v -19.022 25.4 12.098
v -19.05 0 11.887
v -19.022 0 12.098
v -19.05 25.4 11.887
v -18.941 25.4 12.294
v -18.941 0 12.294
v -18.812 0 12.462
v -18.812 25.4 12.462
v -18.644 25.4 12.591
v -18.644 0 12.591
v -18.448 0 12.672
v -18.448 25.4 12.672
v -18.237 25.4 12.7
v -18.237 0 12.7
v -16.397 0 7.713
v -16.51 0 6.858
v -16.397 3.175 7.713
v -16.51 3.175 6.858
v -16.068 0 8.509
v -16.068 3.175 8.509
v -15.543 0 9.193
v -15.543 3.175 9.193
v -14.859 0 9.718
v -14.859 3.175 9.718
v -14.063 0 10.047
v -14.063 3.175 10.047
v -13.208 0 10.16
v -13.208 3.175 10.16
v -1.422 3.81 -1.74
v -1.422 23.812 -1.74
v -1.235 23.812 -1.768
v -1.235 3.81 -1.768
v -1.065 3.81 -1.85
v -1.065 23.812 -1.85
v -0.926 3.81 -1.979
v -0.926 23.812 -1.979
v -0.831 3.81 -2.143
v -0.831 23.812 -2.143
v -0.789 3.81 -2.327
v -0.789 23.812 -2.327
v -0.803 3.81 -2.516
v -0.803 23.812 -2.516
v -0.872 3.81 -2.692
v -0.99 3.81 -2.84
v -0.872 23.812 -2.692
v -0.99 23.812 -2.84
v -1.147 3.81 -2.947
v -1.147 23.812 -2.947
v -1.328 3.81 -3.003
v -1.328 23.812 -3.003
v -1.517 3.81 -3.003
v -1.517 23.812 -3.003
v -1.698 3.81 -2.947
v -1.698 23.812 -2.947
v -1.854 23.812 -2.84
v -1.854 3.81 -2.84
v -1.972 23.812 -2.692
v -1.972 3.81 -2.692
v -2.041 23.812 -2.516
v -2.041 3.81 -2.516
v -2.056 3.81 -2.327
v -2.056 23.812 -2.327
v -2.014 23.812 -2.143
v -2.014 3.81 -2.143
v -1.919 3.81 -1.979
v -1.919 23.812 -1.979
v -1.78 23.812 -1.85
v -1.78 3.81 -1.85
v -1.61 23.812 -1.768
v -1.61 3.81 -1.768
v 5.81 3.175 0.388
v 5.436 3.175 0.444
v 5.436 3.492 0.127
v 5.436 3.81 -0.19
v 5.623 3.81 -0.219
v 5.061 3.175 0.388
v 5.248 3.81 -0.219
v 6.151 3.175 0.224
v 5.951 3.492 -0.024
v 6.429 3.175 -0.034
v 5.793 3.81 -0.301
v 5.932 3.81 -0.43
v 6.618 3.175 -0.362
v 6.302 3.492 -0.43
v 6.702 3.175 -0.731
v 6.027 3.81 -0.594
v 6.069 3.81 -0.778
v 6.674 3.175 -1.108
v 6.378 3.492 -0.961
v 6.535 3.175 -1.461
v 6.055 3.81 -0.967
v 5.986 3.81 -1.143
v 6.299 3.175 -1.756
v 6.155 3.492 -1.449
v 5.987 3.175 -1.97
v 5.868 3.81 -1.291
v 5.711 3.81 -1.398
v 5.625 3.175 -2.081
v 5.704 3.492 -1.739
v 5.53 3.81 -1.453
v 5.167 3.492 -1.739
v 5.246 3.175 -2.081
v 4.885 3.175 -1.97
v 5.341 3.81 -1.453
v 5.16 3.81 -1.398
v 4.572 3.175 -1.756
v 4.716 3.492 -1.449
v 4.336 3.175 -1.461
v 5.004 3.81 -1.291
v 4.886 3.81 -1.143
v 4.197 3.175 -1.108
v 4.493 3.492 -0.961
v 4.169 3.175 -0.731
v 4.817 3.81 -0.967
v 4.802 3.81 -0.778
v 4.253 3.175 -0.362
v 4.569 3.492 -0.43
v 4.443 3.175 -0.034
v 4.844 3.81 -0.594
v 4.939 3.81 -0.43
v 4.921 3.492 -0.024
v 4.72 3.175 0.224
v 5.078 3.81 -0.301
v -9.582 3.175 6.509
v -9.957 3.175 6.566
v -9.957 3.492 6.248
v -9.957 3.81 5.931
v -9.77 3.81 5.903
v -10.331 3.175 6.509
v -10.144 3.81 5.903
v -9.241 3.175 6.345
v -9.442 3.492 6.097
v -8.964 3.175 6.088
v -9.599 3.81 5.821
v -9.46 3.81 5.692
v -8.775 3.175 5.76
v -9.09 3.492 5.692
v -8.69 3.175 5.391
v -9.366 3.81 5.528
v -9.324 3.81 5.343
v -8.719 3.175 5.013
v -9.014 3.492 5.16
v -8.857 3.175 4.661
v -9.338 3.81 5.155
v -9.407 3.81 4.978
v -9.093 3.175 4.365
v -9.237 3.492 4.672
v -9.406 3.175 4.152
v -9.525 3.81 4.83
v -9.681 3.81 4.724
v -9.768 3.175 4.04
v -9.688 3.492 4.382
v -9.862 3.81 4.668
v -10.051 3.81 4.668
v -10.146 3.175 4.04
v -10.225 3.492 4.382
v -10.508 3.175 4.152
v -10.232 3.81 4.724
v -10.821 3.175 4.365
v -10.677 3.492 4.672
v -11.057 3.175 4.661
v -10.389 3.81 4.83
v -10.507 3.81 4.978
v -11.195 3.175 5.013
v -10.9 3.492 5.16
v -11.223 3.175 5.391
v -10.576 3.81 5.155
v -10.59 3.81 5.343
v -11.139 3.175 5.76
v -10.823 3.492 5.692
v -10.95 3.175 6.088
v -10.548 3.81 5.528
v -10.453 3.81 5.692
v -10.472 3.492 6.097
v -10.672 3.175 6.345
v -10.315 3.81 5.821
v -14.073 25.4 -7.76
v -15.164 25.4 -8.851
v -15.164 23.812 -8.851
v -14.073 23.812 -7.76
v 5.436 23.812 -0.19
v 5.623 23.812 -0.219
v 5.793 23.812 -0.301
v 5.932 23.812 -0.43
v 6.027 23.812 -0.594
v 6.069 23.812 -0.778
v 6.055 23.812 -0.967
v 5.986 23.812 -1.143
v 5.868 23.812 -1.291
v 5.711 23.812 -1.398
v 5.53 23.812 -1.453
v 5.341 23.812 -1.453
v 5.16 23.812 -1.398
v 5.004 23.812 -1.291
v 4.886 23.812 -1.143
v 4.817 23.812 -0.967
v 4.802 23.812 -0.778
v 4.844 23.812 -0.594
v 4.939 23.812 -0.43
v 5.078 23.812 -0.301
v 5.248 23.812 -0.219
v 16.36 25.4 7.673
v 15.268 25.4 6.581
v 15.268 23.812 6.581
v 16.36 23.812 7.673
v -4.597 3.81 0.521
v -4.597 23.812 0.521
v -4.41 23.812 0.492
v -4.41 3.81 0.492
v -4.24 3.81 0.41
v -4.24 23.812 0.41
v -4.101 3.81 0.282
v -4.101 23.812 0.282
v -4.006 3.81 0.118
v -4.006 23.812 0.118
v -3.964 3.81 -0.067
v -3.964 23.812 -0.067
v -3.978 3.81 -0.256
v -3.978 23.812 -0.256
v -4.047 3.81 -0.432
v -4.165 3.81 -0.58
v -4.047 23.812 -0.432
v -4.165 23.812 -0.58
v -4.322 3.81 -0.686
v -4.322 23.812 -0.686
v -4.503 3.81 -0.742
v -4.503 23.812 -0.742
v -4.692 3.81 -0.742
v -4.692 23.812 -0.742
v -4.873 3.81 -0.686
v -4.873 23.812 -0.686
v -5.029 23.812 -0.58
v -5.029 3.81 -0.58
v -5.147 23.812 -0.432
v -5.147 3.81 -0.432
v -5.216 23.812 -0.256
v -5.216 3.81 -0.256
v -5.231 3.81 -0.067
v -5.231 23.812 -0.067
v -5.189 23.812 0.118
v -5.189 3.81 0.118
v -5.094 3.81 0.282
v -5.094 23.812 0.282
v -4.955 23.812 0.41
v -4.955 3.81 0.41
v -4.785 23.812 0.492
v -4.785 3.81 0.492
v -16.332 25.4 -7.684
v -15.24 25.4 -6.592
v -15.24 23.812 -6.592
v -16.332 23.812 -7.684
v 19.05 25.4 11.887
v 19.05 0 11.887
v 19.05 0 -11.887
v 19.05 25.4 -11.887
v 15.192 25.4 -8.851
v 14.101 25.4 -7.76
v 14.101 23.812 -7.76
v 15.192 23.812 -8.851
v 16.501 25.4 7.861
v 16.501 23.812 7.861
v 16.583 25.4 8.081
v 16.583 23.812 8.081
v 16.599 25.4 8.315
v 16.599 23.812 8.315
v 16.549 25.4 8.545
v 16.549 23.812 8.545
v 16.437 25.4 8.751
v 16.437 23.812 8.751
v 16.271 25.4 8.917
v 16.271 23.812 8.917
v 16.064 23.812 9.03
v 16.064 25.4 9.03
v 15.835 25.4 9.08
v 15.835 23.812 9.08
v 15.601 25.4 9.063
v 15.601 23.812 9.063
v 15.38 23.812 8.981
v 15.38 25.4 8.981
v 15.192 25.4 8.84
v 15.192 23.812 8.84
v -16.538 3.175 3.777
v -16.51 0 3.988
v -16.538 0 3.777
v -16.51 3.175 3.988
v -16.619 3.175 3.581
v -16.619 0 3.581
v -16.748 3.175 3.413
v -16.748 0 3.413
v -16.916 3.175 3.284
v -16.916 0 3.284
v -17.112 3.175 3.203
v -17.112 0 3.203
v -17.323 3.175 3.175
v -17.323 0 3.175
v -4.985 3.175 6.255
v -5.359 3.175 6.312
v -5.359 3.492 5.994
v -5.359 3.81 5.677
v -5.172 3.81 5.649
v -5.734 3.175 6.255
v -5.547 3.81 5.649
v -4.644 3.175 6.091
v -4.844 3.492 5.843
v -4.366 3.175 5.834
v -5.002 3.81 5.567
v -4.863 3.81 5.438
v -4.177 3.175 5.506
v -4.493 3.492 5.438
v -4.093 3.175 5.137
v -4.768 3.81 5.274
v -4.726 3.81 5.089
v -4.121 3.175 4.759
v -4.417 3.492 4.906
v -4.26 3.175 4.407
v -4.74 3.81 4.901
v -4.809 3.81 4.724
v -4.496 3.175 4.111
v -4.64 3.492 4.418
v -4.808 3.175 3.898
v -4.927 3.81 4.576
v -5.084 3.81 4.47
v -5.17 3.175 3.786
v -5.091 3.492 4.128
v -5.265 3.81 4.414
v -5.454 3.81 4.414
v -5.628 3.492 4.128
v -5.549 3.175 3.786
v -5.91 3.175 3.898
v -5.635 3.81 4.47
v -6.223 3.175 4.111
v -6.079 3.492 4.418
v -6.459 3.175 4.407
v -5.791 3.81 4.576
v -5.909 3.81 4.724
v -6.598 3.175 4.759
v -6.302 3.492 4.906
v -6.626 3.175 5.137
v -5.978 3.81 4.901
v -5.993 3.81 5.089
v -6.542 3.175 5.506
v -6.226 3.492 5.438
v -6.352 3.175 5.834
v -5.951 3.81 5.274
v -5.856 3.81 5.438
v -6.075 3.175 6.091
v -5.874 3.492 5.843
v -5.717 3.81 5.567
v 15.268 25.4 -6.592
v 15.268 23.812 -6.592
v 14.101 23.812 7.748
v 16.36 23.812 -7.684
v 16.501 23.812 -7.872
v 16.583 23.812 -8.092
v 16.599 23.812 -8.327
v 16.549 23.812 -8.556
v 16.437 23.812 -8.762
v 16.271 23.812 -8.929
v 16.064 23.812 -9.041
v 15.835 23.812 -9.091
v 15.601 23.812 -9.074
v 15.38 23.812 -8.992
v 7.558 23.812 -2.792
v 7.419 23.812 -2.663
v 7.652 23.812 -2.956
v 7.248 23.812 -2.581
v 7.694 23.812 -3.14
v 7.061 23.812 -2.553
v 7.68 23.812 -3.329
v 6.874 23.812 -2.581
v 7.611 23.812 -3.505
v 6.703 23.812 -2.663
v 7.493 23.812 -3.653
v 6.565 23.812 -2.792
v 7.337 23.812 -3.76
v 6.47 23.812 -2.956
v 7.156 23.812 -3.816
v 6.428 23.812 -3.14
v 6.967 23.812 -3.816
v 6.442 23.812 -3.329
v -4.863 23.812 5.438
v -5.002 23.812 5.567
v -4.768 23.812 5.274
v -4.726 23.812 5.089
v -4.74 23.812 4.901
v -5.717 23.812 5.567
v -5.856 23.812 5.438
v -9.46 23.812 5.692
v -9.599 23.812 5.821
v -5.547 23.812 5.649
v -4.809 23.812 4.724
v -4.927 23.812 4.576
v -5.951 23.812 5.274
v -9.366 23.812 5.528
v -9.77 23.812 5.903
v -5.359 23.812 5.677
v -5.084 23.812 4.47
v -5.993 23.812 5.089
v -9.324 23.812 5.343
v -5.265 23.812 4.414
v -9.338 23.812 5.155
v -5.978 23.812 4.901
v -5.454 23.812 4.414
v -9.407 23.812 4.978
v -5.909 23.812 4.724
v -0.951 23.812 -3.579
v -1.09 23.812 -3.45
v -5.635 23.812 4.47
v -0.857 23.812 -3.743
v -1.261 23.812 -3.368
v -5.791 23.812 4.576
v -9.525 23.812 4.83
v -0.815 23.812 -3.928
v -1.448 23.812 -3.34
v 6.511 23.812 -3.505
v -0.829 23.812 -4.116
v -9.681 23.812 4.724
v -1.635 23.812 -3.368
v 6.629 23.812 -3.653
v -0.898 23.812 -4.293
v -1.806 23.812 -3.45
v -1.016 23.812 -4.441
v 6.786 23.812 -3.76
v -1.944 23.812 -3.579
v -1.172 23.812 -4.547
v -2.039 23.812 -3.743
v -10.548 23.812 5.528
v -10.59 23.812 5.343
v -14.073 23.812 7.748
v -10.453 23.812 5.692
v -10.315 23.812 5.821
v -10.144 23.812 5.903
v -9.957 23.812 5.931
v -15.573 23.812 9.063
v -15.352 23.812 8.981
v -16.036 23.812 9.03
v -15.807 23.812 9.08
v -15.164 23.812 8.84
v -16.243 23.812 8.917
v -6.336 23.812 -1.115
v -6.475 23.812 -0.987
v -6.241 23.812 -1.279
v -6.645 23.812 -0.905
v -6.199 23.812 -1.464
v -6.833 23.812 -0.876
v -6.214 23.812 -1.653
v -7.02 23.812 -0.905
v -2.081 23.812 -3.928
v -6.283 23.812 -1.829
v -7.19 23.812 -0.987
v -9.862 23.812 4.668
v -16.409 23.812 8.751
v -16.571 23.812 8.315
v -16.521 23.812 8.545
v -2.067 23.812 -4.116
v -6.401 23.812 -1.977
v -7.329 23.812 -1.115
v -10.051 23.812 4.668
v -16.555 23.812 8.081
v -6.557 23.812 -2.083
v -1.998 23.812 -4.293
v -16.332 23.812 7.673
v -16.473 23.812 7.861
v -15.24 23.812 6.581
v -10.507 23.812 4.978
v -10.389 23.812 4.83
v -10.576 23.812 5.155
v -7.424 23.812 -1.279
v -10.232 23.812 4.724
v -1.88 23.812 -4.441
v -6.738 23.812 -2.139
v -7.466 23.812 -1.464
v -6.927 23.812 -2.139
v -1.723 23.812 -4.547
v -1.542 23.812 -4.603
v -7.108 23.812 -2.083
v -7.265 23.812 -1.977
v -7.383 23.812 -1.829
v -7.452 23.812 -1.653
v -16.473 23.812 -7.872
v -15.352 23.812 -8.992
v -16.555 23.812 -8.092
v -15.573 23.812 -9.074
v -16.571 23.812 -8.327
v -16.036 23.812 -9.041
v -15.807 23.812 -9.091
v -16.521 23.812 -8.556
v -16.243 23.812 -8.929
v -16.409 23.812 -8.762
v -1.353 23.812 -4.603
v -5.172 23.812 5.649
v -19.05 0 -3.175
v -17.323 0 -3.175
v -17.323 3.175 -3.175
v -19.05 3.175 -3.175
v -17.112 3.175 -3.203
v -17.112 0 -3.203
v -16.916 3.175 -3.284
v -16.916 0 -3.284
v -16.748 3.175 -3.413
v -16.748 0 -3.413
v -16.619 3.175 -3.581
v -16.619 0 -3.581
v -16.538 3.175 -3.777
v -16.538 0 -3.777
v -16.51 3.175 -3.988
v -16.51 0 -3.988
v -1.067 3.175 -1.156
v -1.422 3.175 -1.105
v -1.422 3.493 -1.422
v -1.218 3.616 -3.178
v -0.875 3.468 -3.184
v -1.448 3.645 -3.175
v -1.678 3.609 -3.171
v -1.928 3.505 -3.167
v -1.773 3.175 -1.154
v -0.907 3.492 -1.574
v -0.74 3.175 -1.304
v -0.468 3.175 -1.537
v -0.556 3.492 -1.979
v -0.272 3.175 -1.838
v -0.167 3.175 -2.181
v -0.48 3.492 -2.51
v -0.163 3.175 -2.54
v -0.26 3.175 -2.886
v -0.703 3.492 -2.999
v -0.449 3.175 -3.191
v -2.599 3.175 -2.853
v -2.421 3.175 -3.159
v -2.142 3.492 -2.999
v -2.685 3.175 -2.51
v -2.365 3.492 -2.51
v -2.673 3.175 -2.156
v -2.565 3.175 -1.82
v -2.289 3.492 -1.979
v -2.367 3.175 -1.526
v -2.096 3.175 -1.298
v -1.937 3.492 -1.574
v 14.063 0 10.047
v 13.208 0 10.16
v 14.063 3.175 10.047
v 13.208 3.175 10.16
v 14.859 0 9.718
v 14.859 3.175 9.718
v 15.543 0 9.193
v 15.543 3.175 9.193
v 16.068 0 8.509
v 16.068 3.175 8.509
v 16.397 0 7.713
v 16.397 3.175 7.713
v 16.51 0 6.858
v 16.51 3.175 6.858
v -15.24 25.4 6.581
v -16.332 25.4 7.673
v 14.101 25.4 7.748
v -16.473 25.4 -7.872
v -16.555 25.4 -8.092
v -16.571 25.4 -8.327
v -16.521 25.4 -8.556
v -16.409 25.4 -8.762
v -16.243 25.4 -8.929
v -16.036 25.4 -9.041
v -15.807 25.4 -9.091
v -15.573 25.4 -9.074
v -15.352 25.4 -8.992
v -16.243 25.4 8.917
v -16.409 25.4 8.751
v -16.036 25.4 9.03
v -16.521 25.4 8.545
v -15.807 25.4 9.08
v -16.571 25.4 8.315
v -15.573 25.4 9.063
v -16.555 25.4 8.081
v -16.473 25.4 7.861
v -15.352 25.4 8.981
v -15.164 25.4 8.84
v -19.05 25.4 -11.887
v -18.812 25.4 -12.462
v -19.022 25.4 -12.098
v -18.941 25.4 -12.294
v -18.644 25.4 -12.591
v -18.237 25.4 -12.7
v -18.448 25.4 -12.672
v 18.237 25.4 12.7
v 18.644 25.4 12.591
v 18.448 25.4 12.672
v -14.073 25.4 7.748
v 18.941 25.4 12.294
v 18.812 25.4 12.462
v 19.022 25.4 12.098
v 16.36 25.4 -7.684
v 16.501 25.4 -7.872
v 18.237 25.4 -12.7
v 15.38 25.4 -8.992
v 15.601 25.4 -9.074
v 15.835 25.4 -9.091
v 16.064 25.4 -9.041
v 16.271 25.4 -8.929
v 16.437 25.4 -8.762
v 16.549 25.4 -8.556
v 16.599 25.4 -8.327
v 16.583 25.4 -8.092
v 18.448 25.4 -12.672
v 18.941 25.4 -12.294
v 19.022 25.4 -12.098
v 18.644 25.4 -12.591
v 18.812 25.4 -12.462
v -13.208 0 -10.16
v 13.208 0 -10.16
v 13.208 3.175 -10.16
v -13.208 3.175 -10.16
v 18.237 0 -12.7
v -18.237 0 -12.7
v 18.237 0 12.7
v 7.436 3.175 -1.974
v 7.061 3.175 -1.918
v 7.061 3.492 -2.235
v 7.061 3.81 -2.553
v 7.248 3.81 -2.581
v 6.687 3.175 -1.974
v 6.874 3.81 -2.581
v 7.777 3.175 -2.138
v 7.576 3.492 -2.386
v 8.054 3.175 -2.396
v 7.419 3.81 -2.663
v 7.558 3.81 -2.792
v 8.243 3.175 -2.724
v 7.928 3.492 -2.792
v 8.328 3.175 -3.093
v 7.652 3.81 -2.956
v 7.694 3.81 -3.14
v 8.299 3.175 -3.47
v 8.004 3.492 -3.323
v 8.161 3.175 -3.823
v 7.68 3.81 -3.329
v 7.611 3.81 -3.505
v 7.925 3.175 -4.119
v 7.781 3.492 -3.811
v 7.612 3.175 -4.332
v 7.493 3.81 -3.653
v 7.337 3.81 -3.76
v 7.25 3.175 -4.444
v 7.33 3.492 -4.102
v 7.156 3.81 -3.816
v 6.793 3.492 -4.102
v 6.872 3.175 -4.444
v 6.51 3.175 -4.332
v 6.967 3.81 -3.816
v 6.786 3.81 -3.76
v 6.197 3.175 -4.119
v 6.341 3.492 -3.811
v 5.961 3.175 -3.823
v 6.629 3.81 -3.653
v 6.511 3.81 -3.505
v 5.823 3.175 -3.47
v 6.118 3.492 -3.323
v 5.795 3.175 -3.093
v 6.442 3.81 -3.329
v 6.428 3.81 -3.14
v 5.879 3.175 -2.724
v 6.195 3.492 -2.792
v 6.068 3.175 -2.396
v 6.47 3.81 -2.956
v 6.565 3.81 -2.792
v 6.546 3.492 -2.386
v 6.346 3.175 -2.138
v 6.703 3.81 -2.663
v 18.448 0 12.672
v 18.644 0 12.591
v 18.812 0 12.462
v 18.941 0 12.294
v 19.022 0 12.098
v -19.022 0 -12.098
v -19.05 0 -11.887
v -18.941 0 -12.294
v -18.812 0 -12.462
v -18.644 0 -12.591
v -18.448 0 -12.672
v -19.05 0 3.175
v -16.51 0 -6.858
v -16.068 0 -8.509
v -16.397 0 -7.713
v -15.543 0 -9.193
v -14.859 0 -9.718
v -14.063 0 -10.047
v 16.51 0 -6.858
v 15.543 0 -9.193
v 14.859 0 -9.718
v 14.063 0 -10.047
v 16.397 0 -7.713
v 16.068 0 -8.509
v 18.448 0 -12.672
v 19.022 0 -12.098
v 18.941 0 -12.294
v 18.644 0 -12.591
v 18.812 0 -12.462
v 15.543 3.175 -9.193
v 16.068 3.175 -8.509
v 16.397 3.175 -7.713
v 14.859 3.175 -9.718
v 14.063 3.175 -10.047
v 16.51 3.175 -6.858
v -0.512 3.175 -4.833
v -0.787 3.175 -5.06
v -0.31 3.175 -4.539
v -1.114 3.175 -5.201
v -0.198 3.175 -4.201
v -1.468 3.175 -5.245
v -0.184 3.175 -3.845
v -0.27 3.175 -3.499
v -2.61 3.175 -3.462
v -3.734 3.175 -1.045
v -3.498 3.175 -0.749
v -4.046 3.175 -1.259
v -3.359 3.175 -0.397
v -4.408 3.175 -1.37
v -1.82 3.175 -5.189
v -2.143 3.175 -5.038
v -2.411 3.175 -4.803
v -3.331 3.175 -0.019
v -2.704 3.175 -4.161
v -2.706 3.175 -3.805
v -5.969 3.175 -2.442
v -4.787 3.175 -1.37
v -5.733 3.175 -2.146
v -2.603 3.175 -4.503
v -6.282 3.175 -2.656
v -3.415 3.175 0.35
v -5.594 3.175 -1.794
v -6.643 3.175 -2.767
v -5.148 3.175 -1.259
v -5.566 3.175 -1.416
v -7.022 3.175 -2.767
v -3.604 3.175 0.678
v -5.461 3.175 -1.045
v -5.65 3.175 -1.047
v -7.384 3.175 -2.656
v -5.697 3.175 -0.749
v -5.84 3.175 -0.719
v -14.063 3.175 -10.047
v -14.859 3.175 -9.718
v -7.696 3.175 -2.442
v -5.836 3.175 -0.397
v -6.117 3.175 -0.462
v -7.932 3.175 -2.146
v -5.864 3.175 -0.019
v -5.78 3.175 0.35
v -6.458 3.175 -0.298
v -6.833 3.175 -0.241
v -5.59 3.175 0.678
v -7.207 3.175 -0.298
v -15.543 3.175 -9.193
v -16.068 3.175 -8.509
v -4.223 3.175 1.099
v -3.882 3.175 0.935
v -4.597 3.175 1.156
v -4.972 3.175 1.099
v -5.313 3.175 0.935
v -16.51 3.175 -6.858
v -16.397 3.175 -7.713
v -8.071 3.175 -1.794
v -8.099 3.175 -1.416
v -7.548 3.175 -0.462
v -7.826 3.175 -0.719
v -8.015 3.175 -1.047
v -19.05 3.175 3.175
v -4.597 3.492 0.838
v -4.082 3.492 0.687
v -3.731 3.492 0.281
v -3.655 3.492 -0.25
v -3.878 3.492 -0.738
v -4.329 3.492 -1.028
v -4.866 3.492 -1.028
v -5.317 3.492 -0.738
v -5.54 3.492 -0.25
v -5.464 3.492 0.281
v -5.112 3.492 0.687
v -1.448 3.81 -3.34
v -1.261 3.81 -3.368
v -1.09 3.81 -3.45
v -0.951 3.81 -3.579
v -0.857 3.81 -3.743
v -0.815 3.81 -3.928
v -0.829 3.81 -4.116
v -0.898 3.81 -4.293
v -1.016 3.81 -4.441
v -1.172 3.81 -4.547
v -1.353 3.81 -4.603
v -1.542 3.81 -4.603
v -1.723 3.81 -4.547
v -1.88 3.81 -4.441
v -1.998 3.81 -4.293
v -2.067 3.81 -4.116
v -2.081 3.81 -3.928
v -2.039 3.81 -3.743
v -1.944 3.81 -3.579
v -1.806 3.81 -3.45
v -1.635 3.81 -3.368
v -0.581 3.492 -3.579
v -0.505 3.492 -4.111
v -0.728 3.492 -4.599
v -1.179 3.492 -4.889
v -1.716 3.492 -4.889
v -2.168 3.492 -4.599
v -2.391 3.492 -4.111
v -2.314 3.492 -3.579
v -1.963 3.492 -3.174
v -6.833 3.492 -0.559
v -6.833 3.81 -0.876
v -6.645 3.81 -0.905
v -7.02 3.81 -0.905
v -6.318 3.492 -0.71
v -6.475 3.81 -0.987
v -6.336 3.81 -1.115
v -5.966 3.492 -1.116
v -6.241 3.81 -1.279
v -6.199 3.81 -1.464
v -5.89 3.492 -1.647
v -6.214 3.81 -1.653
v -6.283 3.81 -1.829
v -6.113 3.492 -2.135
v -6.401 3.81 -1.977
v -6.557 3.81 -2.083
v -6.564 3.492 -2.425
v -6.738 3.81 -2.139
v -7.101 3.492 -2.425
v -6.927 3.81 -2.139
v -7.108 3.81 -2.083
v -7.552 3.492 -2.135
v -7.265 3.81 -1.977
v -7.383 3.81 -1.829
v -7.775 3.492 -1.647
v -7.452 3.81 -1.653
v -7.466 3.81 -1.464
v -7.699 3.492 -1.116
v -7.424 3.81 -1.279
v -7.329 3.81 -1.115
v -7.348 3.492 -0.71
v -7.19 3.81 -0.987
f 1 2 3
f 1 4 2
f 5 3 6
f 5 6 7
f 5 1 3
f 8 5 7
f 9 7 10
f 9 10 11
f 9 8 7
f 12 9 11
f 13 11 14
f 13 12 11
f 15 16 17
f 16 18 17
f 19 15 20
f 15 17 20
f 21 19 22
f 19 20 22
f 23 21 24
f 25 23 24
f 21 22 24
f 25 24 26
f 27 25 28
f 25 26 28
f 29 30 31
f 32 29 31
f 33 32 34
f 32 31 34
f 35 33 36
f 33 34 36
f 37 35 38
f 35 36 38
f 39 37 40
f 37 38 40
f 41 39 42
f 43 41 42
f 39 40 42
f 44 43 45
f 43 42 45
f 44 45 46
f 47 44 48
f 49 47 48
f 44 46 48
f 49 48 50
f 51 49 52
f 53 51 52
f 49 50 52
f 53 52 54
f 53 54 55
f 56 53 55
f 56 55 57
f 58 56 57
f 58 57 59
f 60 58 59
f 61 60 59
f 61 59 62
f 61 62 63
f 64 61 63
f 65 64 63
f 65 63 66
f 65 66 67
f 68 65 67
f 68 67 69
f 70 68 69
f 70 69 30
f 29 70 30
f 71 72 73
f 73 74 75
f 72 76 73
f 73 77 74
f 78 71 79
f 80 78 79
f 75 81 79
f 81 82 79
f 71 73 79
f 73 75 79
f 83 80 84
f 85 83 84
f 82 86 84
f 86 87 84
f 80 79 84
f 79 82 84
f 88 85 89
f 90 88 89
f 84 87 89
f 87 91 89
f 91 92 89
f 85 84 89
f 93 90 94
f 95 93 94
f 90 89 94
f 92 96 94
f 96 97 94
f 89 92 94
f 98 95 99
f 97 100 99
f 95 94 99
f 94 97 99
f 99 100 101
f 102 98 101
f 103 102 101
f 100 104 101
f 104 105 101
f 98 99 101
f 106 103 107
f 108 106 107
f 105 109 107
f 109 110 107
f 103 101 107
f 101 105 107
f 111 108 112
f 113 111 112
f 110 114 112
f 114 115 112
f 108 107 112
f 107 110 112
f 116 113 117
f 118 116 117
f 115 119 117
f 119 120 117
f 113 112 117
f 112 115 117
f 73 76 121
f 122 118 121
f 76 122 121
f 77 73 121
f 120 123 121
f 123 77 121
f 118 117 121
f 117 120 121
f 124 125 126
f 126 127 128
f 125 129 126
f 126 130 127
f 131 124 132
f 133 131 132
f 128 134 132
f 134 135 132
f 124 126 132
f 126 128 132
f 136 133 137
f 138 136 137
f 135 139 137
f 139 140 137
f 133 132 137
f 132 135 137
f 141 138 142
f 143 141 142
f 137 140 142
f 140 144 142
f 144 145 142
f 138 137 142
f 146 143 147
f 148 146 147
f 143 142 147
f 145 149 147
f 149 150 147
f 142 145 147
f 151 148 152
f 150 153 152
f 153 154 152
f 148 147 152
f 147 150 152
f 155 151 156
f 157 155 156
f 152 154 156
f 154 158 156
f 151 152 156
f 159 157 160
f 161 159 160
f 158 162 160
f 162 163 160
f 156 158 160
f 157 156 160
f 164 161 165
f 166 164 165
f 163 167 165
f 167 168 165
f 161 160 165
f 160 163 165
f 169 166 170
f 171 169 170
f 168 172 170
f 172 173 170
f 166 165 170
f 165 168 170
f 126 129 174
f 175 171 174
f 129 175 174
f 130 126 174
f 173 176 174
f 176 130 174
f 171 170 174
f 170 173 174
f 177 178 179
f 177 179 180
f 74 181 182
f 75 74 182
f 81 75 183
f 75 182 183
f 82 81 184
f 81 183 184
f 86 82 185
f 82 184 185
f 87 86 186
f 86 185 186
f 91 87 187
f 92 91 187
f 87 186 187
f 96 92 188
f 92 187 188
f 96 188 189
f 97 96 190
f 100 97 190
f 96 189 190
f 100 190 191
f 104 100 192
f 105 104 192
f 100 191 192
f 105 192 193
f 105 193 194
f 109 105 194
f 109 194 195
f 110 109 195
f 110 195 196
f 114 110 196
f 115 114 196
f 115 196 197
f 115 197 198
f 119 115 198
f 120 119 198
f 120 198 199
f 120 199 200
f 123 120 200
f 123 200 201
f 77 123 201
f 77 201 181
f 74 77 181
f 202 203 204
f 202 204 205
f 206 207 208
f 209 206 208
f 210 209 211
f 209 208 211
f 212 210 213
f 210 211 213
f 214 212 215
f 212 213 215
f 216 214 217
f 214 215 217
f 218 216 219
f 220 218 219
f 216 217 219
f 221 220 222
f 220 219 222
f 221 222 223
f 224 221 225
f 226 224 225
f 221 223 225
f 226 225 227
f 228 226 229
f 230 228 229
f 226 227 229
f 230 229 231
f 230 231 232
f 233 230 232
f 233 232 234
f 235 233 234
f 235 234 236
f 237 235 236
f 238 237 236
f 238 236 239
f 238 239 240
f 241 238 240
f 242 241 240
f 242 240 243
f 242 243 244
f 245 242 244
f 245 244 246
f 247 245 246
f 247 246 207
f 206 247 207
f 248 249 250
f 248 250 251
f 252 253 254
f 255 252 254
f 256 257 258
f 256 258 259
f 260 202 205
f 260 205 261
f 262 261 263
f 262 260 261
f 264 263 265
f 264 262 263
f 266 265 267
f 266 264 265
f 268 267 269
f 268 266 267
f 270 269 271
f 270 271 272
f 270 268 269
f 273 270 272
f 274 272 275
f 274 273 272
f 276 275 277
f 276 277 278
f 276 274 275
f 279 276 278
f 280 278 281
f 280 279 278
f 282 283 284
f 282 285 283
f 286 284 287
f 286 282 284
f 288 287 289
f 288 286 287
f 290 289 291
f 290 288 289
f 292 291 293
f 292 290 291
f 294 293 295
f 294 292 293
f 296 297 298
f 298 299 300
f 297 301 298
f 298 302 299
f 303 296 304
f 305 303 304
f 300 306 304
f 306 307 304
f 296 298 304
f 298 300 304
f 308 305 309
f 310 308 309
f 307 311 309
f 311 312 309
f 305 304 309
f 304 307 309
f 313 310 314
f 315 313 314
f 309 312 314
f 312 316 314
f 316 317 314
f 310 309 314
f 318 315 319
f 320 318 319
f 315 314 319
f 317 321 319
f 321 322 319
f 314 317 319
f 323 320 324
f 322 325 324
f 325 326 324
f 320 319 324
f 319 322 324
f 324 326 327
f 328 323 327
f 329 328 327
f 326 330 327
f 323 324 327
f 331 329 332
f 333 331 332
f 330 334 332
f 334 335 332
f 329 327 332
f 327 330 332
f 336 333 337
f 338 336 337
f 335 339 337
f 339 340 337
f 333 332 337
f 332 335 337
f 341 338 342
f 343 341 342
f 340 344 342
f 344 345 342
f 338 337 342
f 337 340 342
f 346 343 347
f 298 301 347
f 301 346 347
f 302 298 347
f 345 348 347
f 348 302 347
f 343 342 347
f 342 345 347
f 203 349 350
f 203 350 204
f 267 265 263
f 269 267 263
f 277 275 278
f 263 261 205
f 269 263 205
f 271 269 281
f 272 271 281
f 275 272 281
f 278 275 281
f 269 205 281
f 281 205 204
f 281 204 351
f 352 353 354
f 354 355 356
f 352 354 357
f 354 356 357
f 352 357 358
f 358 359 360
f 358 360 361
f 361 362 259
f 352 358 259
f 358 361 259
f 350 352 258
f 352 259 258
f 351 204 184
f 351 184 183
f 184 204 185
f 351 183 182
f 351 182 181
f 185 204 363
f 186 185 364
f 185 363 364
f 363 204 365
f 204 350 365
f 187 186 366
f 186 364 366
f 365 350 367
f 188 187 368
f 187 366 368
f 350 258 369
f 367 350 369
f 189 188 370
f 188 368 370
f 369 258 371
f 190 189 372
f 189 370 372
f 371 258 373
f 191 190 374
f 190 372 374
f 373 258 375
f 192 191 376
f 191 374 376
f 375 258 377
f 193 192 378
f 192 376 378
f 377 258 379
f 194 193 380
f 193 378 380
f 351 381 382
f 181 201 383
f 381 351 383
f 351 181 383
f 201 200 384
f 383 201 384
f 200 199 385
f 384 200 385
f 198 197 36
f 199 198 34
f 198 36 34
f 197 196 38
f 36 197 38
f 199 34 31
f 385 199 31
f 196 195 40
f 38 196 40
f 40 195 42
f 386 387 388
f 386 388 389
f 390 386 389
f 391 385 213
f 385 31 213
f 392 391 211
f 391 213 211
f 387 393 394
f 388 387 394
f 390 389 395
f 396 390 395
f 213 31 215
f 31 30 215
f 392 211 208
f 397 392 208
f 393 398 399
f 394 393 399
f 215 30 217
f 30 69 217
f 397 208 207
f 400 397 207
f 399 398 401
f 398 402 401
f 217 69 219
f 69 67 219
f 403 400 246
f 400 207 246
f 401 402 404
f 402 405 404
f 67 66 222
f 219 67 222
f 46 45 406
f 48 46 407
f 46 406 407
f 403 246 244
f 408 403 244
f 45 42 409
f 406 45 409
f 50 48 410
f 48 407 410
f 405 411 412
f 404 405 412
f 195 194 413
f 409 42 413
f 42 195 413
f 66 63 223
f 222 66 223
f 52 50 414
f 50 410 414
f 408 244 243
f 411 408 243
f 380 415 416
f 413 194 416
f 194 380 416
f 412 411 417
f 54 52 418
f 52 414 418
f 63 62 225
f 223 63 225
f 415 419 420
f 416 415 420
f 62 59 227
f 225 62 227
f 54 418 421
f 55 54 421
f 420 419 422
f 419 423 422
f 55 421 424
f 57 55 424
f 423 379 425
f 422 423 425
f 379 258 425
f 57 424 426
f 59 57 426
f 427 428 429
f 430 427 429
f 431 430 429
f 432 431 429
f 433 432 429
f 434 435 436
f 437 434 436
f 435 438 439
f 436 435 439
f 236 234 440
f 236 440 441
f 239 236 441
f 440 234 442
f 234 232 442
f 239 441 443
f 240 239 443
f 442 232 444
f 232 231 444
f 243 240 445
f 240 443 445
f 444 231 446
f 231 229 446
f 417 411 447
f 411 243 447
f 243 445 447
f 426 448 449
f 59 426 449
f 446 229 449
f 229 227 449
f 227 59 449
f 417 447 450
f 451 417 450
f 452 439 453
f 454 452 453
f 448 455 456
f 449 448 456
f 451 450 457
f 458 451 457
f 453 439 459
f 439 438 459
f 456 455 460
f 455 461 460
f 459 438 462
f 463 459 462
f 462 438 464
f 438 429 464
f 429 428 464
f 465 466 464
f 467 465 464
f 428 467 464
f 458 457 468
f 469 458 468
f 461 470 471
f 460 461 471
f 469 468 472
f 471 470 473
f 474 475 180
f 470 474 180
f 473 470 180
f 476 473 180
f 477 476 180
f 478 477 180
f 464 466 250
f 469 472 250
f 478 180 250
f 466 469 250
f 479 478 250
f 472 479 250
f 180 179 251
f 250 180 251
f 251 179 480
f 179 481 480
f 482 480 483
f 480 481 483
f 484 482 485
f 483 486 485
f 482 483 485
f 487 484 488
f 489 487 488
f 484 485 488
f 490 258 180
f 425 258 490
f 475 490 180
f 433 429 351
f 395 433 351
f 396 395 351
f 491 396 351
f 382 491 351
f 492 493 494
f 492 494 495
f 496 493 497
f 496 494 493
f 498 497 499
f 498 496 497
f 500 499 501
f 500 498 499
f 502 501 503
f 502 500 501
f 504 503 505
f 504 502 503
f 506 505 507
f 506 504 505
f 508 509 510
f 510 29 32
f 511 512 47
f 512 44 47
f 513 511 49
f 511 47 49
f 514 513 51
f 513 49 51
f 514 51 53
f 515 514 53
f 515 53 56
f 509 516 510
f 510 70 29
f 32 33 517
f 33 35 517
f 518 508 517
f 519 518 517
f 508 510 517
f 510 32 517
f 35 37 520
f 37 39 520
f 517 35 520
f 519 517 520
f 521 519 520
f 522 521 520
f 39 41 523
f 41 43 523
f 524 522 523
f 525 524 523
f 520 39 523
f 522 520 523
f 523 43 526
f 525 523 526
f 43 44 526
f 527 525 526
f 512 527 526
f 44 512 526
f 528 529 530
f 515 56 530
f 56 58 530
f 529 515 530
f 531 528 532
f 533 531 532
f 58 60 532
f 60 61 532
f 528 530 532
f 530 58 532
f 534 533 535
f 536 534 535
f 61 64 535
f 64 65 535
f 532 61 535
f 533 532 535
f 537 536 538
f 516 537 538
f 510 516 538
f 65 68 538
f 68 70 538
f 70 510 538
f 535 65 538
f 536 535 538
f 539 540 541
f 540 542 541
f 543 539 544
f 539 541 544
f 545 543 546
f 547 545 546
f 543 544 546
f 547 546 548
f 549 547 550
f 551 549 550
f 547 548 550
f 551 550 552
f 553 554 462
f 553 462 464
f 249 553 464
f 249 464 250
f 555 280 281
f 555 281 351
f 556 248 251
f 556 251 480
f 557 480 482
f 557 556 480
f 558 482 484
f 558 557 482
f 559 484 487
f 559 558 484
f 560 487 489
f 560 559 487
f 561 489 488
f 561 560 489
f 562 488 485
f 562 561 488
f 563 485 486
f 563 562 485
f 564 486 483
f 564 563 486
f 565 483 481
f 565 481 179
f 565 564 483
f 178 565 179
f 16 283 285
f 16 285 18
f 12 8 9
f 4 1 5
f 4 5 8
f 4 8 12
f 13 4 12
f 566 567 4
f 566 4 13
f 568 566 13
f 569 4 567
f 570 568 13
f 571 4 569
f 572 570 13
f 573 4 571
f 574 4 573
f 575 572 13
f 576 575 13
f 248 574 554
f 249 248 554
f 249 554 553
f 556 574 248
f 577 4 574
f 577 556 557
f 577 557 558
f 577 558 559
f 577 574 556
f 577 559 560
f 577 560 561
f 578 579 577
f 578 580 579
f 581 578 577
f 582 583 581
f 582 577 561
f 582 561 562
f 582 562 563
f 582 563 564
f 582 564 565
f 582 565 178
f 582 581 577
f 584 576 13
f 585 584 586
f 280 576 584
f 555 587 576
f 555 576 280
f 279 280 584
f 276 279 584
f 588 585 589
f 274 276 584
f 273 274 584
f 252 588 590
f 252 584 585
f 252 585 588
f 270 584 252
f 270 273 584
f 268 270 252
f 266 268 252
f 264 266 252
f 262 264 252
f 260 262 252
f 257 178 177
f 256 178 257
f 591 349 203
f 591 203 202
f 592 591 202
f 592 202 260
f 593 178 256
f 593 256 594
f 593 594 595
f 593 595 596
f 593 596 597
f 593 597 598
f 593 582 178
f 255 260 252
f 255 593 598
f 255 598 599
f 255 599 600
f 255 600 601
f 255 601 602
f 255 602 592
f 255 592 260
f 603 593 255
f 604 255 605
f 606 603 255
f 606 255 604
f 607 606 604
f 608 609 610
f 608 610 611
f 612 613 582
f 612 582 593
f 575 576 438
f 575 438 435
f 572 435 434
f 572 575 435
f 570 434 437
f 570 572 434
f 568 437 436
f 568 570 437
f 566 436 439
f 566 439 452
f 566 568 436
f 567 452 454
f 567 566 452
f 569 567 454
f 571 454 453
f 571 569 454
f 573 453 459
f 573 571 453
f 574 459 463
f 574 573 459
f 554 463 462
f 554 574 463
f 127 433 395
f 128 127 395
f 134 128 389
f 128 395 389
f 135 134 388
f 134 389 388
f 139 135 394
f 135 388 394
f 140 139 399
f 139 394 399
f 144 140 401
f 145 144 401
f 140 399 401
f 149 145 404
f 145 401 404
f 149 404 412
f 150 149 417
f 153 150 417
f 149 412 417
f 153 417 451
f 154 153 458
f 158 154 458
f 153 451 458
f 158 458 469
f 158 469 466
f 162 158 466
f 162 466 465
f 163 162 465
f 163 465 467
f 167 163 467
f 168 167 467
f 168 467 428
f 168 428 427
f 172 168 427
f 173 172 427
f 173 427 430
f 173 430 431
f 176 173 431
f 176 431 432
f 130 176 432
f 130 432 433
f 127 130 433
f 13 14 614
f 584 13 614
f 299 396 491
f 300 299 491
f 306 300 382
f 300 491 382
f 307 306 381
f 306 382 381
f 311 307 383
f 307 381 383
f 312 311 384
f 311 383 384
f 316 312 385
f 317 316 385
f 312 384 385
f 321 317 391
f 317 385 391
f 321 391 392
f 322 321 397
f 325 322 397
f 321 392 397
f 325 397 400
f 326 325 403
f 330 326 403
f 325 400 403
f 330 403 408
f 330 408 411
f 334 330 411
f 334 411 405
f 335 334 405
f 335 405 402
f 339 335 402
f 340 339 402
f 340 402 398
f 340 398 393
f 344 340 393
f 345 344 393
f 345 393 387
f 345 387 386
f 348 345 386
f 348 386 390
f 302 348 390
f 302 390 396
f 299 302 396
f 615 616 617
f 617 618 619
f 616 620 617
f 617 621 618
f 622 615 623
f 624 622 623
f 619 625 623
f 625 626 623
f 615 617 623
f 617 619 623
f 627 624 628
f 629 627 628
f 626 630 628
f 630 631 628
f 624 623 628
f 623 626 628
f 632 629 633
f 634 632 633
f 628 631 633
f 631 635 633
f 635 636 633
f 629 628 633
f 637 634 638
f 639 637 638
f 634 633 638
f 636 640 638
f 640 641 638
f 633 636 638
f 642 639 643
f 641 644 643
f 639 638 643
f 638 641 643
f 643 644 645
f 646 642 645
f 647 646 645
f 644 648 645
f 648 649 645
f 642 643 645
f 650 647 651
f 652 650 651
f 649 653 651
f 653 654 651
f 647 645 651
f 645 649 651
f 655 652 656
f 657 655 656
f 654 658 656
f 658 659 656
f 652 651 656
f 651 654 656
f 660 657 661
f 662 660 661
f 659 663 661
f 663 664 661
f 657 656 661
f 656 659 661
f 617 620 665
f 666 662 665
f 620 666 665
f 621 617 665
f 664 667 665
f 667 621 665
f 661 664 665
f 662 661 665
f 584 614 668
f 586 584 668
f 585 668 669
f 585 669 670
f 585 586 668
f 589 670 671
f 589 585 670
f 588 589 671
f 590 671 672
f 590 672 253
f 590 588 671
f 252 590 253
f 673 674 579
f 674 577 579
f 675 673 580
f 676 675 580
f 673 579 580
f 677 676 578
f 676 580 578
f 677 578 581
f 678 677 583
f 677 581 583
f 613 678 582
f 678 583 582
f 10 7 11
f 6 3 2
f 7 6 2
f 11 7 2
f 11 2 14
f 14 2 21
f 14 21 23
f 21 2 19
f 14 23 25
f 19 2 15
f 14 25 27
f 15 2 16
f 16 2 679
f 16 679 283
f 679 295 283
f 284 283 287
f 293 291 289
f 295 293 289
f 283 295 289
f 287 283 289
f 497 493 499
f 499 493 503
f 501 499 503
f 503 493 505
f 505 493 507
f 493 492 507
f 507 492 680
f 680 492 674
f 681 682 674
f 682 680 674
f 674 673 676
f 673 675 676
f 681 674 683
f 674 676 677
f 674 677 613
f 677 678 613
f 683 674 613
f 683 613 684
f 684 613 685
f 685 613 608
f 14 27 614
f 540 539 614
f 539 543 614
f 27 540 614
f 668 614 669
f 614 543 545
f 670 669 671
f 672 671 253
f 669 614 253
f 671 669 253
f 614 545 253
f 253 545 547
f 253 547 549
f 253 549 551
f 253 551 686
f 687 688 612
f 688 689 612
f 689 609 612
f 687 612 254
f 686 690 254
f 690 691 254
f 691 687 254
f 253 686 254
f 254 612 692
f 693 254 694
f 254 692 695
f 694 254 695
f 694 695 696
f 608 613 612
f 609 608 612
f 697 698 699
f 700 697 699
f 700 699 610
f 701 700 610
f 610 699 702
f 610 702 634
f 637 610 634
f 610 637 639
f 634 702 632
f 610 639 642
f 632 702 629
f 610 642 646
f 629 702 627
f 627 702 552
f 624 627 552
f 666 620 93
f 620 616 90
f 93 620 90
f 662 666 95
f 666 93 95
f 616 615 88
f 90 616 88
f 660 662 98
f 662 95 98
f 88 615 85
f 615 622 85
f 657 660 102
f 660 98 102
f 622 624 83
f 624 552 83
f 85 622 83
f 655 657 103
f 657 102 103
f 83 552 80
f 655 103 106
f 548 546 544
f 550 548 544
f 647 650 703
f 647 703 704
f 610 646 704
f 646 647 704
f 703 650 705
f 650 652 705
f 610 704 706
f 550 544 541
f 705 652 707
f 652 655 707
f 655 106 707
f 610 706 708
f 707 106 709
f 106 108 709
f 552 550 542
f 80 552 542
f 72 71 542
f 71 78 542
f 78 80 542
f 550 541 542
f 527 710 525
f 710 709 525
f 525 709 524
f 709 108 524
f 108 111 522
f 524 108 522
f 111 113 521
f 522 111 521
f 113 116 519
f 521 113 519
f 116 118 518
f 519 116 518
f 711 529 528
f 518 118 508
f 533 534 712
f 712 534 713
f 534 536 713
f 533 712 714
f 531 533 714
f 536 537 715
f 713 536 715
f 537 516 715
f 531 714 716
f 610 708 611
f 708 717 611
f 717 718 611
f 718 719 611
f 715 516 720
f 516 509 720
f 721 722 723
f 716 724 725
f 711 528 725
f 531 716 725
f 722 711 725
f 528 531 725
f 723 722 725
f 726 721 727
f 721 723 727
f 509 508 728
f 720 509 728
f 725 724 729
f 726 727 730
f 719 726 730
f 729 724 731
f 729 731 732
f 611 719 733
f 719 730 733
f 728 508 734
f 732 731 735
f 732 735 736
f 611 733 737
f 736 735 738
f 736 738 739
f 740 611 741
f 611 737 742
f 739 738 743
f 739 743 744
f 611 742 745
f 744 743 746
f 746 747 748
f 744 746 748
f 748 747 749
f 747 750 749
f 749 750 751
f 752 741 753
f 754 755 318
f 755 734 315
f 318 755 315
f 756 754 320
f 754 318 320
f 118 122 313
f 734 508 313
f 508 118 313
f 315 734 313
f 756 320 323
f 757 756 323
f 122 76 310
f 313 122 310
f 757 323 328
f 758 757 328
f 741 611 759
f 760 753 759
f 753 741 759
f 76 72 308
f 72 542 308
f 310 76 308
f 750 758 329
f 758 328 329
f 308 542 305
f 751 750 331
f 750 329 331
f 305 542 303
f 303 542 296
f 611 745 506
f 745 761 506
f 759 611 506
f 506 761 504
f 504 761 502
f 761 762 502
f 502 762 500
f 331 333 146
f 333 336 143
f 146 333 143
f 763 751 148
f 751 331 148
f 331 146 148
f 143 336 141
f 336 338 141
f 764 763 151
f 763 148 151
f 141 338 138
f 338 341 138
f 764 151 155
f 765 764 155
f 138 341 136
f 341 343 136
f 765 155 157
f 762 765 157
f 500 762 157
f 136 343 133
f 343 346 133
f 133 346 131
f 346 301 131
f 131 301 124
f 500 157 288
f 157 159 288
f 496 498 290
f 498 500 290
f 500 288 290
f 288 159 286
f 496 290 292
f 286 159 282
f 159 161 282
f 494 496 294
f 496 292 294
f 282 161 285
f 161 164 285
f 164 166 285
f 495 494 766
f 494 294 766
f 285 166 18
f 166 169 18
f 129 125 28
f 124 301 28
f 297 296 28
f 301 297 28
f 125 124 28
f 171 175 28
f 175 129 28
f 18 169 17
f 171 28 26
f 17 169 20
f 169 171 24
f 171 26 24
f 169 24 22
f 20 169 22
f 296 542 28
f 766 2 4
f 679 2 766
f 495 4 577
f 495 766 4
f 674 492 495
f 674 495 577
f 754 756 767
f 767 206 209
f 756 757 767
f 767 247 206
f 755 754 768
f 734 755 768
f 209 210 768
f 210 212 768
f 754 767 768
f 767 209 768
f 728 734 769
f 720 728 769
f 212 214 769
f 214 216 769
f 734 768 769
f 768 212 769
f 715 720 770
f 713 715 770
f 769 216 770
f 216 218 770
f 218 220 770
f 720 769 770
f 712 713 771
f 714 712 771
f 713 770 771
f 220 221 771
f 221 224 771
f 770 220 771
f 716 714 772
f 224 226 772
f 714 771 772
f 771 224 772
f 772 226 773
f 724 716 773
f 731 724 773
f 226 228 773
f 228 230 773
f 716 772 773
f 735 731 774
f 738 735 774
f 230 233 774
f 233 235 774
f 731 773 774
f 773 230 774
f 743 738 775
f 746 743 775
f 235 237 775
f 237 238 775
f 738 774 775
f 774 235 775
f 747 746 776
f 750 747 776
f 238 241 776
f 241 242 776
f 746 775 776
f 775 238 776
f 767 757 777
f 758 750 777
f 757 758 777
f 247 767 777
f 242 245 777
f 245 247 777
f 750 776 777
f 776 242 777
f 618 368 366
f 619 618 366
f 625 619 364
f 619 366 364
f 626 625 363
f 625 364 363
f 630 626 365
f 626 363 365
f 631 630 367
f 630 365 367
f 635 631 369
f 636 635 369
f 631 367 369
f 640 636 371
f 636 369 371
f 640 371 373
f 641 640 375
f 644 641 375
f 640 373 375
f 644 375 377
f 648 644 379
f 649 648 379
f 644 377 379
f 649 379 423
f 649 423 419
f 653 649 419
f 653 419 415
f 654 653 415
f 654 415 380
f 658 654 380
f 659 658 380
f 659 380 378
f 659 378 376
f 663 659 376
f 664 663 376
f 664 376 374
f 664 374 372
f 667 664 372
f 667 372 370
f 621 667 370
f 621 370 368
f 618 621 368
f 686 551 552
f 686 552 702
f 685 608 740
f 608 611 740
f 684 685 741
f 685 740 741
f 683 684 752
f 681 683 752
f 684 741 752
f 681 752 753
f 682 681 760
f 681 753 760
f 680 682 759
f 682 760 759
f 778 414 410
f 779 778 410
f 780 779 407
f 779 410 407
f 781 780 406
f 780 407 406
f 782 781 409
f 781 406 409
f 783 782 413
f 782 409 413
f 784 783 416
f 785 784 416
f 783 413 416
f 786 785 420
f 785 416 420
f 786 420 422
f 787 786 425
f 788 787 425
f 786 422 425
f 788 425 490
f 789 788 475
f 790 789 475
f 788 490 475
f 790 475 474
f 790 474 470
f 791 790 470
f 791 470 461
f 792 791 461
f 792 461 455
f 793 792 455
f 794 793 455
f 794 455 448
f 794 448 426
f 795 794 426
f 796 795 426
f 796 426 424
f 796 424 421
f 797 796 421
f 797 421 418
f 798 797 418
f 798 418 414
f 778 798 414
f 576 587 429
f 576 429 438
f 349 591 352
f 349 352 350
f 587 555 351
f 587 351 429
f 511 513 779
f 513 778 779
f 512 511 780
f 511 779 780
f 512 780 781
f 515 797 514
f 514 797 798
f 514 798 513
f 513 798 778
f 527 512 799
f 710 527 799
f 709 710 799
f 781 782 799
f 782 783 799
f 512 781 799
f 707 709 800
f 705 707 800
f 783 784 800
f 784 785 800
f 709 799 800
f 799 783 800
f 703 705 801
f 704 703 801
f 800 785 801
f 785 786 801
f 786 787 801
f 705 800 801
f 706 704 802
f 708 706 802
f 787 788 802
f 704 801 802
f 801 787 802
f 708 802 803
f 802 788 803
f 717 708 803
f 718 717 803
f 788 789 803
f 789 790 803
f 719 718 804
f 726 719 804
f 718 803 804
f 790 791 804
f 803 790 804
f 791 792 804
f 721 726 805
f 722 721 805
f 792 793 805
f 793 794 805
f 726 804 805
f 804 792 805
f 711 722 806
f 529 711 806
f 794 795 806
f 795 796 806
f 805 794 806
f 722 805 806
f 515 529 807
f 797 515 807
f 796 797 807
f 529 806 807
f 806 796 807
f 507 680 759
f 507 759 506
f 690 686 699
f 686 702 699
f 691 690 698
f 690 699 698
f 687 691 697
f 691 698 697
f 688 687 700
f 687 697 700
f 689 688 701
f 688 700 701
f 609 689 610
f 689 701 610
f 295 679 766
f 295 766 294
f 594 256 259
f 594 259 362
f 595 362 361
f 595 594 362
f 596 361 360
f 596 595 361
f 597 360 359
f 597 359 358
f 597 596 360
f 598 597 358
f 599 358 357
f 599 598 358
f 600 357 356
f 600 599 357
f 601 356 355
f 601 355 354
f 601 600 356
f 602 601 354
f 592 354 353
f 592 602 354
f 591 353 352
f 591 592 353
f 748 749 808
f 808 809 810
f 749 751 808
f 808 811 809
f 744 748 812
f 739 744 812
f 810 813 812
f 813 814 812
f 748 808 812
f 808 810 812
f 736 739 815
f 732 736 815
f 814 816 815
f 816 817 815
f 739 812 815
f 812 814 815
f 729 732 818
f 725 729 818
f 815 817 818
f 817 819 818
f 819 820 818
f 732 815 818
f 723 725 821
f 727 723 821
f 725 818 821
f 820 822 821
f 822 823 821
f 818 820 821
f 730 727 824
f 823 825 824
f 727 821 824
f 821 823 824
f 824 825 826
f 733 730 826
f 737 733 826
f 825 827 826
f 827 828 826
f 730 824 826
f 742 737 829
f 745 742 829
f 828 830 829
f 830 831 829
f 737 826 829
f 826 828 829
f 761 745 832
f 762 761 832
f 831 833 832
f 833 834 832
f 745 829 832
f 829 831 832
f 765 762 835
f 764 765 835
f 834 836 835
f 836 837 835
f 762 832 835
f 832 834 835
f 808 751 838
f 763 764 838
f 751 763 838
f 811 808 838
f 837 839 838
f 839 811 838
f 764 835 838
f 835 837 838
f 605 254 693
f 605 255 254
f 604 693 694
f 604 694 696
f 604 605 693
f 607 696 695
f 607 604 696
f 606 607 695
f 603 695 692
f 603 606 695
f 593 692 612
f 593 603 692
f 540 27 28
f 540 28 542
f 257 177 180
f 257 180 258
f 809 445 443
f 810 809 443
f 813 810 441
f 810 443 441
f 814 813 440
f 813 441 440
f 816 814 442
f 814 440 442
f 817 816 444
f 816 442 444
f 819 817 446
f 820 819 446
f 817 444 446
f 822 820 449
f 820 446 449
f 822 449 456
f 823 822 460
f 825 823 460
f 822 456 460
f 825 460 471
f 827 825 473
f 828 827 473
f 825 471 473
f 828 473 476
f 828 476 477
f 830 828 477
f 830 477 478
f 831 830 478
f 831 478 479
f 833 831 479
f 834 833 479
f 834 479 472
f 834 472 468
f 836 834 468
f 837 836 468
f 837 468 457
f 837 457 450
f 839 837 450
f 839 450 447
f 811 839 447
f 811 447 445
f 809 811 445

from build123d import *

# Parameters (mm, degrees)
SKETCH1_W           = 38.1
SKETCH1_H           = 25.4
BOSS_EXTRUDE1_DEPTH = 25.4
SKETCH4_R           = 0.635
CUT_EXTRUDE1_DEPTH  = 35.195796525
CUT_EXTRUDE2_DEPTH  = 1.5875
CUT_EXTRUDE3_DEPTH  = 3.175
FILLET1_R           = 3.302
FILLET2_R           = 0.8128
CHAMFER1_SIZE       = 0.635


with BuildPart() as part:
    # Sketch1 → Boss-Extrude1 (new body)
    with BuildSketch(Plane(origin=(0, 0, 0), x_dir=(1, 0, 0), z_dir=(0, 1, 0))):
        Rectangle(SKETCH1_W, SKETCH1_H)
    extrude(amount=BOSS_EXTRUDE1_DEPTH)

    # Sketch4 → Cut-Extrude1 (cut, through all)
    with BuildSketch(Plane(origin=(0, 25.4, 0), x_dir=(1, 0, 0), z_dir=(0, 1, 0))):
        with Locations(Location((-9.9568, -5.2959, 0), (0, 0, 270))):
            Circle(SKETCH4_R)
        with Locations(Location((-5.3594, -5.0419, 0), (0, 0, 270))):
            Circle(SKETCH4_R)
        with Locations(Location((-4.5974, 0.1143, 0), (0, 0, 270))):
            Circle(SKETCH4_R)
        with Locations(Location((-6.8326, 1.5113, 0), (0, 0, 270))):
            Circle(SKETCH4_R)
        with Locations(Location((-1.4478, 3.9751, 0), (0, 0, 270))):
            Circle(SKETCH4_R)
        with Locations(Location((-1.4224, 2.3749, 0), (0, 0, 270))):
            Circle(SKETCH4_R)
        with Locations(Location((5.4356, 0.8255, 0), (0, 0, 270))):
            Circle(SKETCH4_R)
        with Locations(Location((7.0612, 3.1877, 0), (0, 0, 270))):
            Circle(SKETCH4_R)
    extrude(amount=-CUT_EXTRUDE1_DEPTH, mode=Mode.SUBTRACT)

    # Sketch5 → Cut-Extrude2 (cut)
    with BuildSketch(Plane(origin=(0, 25.4, 0), x_dir=(1, 0, 0), z_dir=(0, 1, 0))):
        with BuildLine():
            Line((-15.164283352, 8.851416648), (-14.072566704, 7.7597))
            Line((-14.072566704, 7.7597), (14.100557504, 7.7597))
            Line((14.100557504, 7.7597), (15.192274152, 8.851416648))
            ThreePointArc((15.192274152, 8.851416648), (16.359707448, 8.851416648), (16.359707448, 7.683983352))
            Line((16.359707448, 7.683983352), (15.2679908, 6.592266704))
            Line((15.2679908, 6.592266704), (15.2679908, -6.580862104))
            Line((15.2679908, -6.580862104), (16.359707448, -7.672578752))
            ThreePointArc((16.359707448, -7.672578752), (16.359707448, -8.840012048), (15.192274152, -8.840012048))
            Line((15.192274152, -8.840012048), (14.100557504, -7.7482954))
            Line((14.100557504, -7.7482954), (-14.072566704, -7.7482954))
            Line((-14.072566704, -7.7482954), (-15.164283352, -8.840012048))
            ThreePointArc((-15.164283352, -8.840012048), (-16.331716648, -8.840012048), (-16.331716648, -7.672578752))
            Line((-16.331716648, -7.672578752), (-15.24, -6.580862104))
            Line((-15.24, -6.580862104), (-15.24, 6.592266704))
            Line((-15.24, 6.592266704), (-16.331716648, 7.683983352))
            ThreePointArc((-16.331716648, 7.683983352), (-16.331716648, 8.851416648), (-15.164283352, 8.851416648))
        make_face()
    extrude(amount=-CUT_EXTRUDE2_DEPTH, mode=Mode.SUBTRACT)

    # Sketch6 → Cut-Extrude3 (cut)
    with BuildSketch(Plane.XZ):
        Polygon((-19.05, -3.175), (-19.05, 3.175), (-16.51, 3.175), (-16.51, 10.16), (16.51, 10.16), (16.51, -10.16), (-16.51, -10.16), (-16.51, -3.175), align=None)
    extrude(amount=-CUT_EXTRUDE3_DEPTH, mode=Mode.SUBTRACT)

    # Fillet1
    fillet1_edges = [part.edges().sort_by_distance(p)[0] for p in [
        (-16.51, 1.5875, 10.16),
        (16.51, 1.5875, 10.16),
        (16.51, 1.5875, -10.16),
        (-16.51, 1.5875, -10.16),
    ]]
    fillet(fillet1_edges, radius=FILLET1_R)

    # Fillet2
    fillet2_edges = [part.edges().sort_by_distance(p)[0] for p in [
        (-16.51, 1.5875, 3.175),
        (-16.51, 1.5875, -3.175),
        (-19.05, 12.7, -12.7),
        (19.05, 12.7, -12.7),
        (19.05, 12.7, 12.7),
        (-19.05, 12.7, 12.7),
    ]]
    fillet(fillet2_edges, radius=FILLET2_R)

    # Chamfer1
    # the kernel refuses this chamfer: 0.635 mm, written as the material it takes off along each edge
    with BuildSketch(Plane(origin=(-5.3594, 3.175, 5.0419), x_dir=(0, 0, 1), z_dir=(-1, 0, 0))) as chamfer1_piece_1:
        Polygon((0.635 + CHAMFER1_SIZE, 0), (0.635, CHAMFER1_SIZE), (0.635, 0), align=None)
    revolve(axis=Axis((-5.3594, 3.175, 5.0419), (0, 1, 0)), mode=Mode.SUBTRACT)
    with BuildSketch(Plane(origin=(-6.8326, 3.175, -1.5113), x_dir=(0, 0, 1), z_dir=(-1, 0, 0))) as chamfer1_piece_2:
        Polygon((0.635 + CHAMFER1_SIZE, 0), (0.635, CHAMFER1_SIZE), (0.635, 0), align=None)
    revolve(axis=Axis((-6.8326, 3.175, -1.5113), (0, 1, 0)), mode=Mode.SUBTRACT)
    with BuildSketch(Plane(origin=(-1.4224, 3.175, -2.3749), x_dir=(0, 0, 1), z_dir=(-1, 0, 0))) as chamfer1_piece_3:
        Polygon((0.635 + CHAMFER1_SIZE, 0), (0.635, CHAMFER1_SIZE), (0.635, 0), align=None)
    revolve(axis=Axis((-1.4224, 3.175, -2.3749), (0, 1, 0)), mode=Mode.SUBTRACT)
    with BuildSketch(Plane(origin=(7.0612, 3.175, -3.1877), x_dir=(0, 0, 1), z_dir=(-1, 0, 0))) as chamfer1_piece_4:
        Polygon((0.635 + CHAMFER1_SIZE, 0), (0.635, CHAMFER1_SIZE), (0.635, 0), align=None)
    revolve(axis=Axis((7.0612, 3.175, -3.1877), (0, 1, 0)), mode=Mode.SUBTRACT)
    with BuildSketch(Plane(origin=(5.4356, 3.175, -0.8255), x_dir=(0, 0, 1), z_dir=(-1, 0, 0))) as chamfer1_piece_5:
        Polygon((0.635 + CHAMFER1_SIZE, 0), (0.635, CHAMFER1_SIZE), (0.635, 0), align=None)
    revolve(axis=Axis((5.4356, 3.175, -0.8255), (0, 1, 0)), mode=Mode.SUBTRACT)
    with BuildSketch(Plane(origin=(-1.4478, 3.175, -3.9751), x_dir=(0, 0, 1), z_dir=(-1, 0, 0))) as chamfer1_piece_6:
        Polygon((0.635 + CHAMFER1_SIZE, 0), (0.635, CHAMFER1_SIZE), (0.635, 0), align=None)
    revolve(axis=Axis((-1.4478, 3.175, -3.9751), (0, 1, 0)), mode=Mode.SUBTRACT)
    with BuildSketch(Plane(origin=(-4.5974, 3.175, -0.1143), x_dir=(0, 0, 1), z_dir=(-1, 0, 0))) as chamfer1_piece_7:
        Polygon((0.635 + CHAMFER1_SIZE, 0), (0.635, CHAMFER1_SIZE), (0.635, 0), align=None)
    revolve(axis=Axis((-4.5974, 3.175, -0.1143), (0, 1, 0)), mode=Mode.SUBTRACT)
    with BuildSketch(Plane(origin=(-9.9568, 3.175, 5.2959), x_dir=(0, 0, 1), z_dir=(-1, 0, 0))) as chamfer1_piece_8:
        Polygon((0.635 + CHAMFER1_SIZE, 0), (0.635, CHAMFER1_SIZE), (0.635, 0), align=None)
    revolve(axis=Axis((-9.9568, 3.175, 5.2959), (0, 1, 0)), mode=Mode.SUBTRACT)


solid = part.part
